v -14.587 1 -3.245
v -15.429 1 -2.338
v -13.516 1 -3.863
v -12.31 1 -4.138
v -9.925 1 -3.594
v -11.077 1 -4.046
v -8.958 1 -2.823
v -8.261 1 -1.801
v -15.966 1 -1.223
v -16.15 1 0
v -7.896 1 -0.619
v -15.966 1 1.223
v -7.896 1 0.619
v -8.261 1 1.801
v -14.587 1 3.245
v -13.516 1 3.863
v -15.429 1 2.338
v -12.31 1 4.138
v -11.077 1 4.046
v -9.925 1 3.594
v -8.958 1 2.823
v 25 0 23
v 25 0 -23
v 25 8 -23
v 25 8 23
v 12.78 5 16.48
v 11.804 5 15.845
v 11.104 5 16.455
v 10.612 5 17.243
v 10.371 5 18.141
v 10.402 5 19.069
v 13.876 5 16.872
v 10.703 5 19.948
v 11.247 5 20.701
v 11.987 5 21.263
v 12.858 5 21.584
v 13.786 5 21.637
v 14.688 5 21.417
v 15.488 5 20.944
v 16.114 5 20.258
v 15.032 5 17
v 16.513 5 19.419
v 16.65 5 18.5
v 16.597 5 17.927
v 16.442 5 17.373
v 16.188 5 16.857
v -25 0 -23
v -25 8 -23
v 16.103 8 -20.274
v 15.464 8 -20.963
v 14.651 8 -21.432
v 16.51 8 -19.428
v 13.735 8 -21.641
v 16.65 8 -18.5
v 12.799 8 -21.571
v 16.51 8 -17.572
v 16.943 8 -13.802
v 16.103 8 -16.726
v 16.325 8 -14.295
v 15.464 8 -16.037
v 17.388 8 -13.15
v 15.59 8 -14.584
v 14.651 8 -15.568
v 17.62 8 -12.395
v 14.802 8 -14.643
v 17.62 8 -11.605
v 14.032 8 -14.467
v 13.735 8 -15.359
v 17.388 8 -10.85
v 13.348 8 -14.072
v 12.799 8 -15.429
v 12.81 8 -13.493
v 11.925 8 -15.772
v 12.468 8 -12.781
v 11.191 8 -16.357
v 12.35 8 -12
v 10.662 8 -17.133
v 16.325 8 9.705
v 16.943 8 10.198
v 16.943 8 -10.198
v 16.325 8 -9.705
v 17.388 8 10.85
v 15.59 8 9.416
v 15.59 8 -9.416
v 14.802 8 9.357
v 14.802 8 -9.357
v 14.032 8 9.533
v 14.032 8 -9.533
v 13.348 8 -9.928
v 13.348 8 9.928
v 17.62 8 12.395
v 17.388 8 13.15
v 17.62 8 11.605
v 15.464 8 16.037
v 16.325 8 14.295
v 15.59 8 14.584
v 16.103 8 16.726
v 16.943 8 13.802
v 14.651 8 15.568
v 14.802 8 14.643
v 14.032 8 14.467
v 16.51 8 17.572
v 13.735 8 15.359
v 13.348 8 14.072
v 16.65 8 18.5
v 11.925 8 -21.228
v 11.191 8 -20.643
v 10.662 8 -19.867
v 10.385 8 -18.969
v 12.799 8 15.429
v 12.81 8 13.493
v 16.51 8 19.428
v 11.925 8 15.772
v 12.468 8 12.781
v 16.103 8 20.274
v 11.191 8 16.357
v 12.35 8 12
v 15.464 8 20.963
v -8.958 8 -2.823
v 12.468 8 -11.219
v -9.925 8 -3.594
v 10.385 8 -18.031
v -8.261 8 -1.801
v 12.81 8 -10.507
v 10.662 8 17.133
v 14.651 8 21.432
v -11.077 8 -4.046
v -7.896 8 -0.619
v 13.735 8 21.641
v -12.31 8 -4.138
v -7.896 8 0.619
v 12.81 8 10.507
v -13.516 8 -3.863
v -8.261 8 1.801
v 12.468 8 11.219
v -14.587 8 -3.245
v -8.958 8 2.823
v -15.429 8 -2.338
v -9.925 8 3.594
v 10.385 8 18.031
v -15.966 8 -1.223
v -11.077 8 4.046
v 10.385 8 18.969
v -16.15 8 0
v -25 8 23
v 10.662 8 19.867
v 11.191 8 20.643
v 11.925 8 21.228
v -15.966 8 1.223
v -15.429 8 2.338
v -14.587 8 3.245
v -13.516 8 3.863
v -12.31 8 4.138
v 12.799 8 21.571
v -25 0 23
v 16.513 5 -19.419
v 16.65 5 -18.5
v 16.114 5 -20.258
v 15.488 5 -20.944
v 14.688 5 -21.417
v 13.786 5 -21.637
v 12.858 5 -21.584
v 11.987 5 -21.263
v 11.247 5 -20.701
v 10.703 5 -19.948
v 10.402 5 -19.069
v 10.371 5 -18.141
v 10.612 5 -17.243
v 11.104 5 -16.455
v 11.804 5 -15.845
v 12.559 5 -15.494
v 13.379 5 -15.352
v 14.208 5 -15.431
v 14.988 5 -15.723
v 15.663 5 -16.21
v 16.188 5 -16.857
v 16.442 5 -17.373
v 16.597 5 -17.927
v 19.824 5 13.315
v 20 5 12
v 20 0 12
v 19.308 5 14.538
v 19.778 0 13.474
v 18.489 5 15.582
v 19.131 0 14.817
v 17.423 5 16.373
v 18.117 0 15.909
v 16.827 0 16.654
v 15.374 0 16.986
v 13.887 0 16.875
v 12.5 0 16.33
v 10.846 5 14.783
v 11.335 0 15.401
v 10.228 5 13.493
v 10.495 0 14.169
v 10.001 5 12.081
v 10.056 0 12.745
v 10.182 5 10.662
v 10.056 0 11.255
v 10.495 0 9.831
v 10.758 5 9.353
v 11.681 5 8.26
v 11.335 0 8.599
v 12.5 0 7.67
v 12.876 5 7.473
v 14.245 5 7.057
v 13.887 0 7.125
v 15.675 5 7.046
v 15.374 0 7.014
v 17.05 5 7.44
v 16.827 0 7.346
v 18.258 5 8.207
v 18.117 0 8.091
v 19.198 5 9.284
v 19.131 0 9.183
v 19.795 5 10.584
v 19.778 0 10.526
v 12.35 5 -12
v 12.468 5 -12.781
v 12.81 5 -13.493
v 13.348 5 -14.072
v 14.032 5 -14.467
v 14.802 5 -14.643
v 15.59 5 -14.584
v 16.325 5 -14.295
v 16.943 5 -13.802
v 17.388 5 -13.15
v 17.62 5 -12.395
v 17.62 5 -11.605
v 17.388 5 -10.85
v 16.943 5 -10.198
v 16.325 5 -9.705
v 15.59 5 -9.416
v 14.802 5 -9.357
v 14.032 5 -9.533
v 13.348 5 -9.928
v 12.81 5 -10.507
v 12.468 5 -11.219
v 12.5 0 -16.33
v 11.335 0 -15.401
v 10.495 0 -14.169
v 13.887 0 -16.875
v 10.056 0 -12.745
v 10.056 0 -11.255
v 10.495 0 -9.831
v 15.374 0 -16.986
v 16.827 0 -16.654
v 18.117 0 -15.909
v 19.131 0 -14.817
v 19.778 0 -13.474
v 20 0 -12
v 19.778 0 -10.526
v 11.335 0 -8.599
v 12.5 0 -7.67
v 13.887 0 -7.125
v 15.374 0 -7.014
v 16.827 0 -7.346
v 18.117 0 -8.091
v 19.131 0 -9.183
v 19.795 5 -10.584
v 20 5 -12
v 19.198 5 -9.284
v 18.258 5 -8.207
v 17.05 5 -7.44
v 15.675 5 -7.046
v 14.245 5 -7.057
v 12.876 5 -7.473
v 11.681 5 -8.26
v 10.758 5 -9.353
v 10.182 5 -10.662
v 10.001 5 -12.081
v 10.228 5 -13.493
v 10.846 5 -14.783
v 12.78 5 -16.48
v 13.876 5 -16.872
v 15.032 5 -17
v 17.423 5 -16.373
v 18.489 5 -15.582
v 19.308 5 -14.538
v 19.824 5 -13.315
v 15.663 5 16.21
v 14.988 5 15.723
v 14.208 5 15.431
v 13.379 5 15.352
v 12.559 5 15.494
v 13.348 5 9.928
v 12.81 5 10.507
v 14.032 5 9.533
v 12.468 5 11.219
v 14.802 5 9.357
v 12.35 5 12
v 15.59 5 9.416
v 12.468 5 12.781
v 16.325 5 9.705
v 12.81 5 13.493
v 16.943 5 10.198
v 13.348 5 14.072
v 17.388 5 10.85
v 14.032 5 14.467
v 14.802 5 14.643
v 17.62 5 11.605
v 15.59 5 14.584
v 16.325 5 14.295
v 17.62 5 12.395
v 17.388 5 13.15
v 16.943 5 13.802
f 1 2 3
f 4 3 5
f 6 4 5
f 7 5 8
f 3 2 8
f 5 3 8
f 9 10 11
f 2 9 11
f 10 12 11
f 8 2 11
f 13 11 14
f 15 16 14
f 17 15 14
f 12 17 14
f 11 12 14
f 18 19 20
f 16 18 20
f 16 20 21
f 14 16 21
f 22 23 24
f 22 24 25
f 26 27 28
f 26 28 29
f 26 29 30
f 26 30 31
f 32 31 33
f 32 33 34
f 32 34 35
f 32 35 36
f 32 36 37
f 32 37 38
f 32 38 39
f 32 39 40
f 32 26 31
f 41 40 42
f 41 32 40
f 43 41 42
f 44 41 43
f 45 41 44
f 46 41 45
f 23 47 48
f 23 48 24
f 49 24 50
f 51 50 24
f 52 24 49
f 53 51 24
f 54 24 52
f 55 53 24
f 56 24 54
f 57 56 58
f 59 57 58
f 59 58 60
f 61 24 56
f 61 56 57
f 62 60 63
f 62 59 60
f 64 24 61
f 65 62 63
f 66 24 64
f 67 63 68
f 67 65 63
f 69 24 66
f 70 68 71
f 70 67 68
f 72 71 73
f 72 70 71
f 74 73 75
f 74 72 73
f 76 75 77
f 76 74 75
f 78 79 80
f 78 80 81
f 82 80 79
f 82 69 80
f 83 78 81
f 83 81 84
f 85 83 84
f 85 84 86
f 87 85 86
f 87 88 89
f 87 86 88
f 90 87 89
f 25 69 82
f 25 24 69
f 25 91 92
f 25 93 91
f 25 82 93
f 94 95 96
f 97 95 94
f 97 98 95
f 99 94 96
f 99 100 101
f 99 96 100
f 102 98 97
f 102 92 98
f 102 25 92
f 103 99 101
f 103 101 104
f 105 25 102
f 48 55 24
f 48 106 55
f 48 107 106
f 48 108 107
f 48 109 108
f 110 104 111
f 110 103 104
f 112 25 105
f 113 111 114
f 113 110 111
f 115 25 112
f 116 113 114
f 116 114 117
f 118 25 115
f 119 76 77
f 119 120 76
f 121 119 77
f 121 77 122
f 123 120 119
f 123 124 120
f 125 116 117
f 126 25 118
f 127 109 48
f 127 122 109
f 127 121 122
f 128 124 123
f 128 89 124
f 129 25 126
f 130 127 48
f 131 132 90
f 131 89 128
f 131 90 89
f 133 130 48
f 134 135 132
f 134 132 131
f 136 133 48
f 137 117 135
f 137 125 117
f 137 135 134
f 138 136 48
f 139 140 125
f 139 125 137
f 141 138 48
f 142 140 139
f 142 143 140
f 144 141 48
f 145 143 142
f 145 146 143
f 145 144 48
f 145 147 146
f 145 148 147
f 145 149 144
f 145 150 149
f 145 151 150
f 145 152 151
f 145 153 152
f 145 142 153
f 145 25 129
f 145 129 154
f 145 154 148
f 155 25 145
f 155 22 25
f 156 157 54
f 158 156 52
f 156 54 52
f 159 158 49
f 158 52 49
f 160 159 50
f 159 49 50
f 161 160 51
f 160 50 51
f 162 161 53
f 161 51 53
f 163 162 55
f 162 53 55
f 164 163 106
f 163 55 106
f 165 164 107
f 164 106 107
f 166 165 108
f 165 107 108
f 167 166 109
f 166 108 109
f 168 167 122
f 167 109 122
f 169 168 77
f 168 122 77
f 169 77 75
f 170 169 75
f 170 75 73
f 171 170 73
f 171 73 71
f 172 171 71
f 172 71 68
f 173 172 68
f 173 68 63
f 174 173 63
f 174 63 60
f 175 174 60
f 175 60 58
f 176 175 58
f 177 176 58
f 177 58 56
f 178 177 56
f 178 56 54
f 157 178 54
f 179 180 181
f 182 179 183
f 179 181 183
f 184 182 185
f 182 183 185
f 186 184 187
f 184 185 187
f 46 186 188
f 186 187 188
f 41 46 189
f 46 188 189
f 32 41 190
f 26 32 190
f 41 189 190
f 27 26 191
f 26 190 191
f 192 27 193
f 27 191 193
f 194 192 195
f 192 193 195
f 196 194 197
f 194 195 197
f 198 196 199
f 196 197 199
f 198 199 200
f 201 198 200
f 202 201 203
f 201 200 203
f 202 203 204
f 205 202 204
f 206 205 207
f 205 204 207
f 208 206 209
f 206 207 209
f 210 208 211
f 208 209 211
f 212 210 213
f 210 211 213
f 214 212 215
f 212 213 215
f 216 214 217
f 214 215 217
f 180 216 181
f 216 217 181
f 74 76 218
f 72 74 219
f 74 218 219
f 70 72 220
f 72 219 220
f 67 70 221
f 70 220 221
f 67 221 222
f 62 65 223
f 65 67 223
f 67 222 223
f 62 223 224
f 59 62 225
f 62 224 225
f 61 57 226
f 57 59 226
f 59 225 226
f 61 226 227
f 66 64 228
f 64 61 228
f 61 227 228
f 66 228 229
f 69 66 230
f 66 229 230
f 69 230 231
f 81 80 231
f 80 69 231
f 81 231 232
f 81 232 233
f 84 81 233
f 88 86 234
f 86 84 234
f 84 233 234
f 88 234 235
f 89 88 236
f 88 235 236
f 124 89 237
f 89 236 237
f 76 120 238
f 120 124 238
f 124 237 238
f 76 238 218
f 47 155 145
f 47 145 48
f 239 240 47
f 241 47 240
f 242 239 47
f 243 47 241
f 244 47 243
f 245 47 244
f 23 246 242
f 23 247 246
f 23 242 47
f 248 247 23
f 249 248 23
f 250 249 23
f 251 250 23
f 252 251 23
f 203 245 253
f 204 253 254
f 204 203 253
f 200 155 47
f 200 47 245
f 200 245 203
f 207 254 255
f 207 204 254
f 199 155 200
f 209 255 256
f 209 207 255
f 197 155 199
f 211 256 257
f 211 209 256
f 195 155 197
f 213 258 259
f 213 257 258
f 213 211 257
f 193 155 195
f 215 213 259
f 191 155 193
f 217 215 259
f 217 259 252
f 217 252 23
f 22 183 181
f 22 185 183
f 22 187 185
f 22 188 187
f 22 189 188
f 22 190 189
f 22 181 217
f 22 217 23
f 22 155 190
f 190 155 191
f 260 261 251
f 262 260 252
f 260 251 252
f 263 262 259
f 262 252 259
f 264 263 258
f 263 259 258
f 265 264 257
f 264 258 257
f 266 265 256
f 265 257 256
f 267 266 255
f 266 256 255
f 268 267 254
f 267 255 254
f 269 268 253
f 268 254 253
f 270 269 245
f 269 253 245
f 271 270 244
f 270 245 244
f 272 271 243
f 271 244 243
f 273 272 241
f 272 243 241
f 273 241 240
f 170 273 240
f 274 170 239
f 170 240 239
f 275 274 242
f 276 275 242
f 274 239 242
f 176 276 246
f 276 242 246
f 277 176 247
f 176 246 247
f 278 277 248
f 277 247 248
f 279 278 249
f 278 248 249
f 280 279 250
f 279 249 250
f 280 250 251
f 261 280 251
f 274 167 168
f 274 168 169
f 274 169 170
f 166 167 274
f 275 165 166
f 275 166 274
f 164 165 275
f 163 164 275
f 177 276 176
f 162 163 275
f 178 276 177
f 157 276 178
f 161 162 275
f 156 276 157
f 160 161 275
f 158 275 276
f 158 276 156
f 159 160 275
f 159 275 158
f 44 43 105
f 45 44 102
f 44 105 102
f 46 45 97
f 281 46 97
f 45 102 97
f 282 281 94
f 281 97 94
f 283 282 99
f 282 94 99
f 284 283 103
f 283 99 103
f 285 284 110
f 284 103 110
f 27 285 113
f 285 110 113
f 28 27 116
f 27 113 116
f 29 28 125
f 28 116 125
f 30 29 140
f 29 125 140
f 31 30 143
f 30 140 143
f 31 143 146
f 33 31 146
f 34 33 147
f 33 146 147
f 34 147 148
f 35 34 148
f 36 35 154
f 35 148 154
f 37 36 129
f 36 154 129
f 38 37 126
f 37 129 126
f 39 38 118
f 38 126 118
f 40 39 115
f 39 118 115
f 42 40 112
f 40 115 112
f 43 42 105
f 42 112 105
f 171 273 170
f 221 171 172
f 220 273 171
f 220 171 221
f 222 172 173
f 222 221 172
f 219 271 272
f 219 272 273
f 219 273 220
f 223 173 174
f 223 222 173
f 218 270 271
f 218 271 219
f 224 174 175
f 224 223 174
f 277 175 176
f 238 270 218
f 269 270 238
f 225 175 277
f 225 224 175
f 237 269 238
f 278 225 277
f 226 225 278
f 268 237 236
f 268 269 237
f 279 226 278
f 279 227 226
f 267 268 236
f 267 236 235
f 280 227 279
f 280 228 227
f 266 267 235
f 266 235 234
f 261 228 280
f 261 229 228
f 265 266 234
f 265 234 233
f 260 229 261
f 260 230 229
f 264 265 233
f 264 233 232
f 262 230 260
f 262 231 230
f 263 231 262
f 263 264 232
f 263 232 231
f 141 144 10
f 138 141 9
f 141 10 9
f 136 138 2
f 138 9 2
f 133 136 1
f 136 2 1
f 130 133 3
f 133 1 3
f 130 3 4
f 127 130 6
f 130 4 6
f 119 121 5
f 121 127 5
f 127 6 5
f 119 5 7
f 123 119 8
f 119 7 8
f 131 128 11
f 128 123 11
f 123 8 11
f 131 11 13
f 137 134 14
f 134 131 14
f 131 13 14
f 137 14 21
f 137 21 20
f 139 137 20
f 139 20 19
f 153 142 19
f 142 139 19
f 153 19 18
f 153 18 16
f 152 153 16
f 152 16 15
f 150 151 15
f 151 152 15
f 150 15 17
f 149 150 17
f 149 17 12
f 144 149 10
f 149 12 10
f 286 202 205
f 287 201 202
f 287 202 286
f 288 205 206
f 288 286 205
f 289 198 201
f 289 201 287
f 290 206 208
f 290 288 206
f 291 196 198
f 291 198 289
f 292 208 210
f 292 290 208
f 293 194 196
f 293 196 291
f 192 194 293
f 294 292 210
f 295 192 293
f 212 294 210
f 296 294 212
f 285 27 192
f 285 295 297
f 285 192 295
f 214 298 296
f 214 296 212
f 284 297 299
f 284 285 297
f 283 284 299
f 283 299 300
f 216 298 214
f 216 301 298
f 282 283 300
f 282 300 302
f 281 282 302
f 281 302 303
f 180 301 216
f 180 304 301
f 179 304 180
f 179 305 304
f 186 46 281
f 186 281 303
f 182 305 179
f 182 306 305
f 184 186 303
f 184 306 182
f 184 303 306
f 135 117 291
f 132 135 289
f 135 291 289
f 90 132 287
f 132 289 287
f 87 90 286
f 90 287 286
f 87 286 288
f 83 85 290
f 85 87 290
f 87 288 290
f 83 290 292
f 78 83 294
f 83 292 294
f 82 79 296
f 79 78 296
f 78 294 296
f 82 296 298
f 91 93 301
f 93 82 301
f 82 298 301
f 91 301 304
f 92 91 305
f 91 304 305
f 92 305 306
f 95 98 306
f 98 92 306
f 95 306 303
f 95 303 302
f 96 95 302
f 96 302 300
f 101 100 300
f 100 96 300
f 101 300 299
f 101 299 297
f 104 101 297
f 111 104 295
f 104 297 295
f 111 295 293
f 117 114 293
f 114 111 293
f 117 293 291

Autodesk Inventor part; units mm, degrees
ref_plane "YZ Plane" through (0, 0, 0) normal (1, 0, 0) x (0, 1, 0)
ref_plane "XZ Plane" through (0, 0, 0) normal (0, 1, 0) x (-1, 0, 0)
ref_plane "XY Plane" through (0, 0, 0) normal (0, 0, 1) x (1, 0, 0)
sketch "Sketch1" plane through (0, 0, 0) normal (0, 1, 0) x (-1, 0, 0)
  line L0 (-25, 23) -> (25, 23)
  line L1 (25, 23) -> (25, -23)
  line L2 (25, -23) -> (-25, -23)
  line L3 (-25, -23) -> (-25, 23)
  line L4 (-25, 23) -> (25, -23) construction
  line L5 (25, 23) -> (-25, -23) construction
  circle A0 centre (12, 0) radius 4.15
  circle A1 centre (-15, -12) radius 2.65
  line L6 (25, 0) -> (-25, 0) construction
  circle A2 centre (-15, 12) radius 2.65
  point P0 (0, 0)
  dimension "d0" = 46
  dimension "d1" = 50
  dimension "d2" = 23
  dimension "d3" = 13
  dimension "d4" = 8.3
  dimension "d5" = 11
  dimension "d6" = 10
  dimension "d7" = 5.3
extrude "Extrusion1" add sketch "Sketch1" along normal blind 8
sketch "Sketch2" plane through (0, 0, 0) normal (0, -1, 0) x (1, 0, 0)
  line L0 (25, -23) -> (-25, -23) projected
  line L1 (25, 23) -> (25, -23) projected
  line L2 (-25, 23) -> (25, 23) projected
  line L3 (-25, -23) -> (-25, 23) projected
  circle A0 centre (15, 12) radius 2.65 construction
  circle A1 centre (15, -12) radius 2.65 construction
  circle A2 centre (-12, 0) radius 4.15 projected
  circle A3 centre (15, -12) radius 2.65 construction
  circle A4 centre (15, -12) radius 5
  circle A5 centre (15, 12) radius 5
  point P0 (0, 0)
  dimension "d10" = 10
  dimension "d11" = 10
extrude "Extrusion2" cut sketch "Sketch2" against normal blind 5 contours A4 | A5
sketch "Sketch3" plane through (0, 8, 0) normal (0, 1, 0) x (1, 0, 0)
  circle A0 centre (13.5, 18.5) radius 3.15
  line L0 (25, -23) -> (25, 23) projected
  line L1 (25, 0) -> (-25, 0) construction
  line L2 (-25, 23) -> (-25, -23) projected
  line L3 (25, 23) -> (-25, 23) projected
  circle A1 centre (13.5, -18.5) radius 3.15
  point P0 (0, 0)
  dimension "d14" = 4.5
  dimension "d15" = 11.5
  dimension "d16" = 6.3
extrude "Extrusion3" cut sketch "Sketch3" against normal blind 3
sketch "Sketch5" plane through (0, 0, 0) normal (0, -1, 0) x (1, 0, 0)
  circle A0 centre (-12, 0) radius 4.15 projected
  point P0 (0, 0)
extrude "Extrusion5" add sketch "Sketch5" against normal blind 1
equation "\"d11\" = d10"
properties part number "Linear Rail End Cap"
